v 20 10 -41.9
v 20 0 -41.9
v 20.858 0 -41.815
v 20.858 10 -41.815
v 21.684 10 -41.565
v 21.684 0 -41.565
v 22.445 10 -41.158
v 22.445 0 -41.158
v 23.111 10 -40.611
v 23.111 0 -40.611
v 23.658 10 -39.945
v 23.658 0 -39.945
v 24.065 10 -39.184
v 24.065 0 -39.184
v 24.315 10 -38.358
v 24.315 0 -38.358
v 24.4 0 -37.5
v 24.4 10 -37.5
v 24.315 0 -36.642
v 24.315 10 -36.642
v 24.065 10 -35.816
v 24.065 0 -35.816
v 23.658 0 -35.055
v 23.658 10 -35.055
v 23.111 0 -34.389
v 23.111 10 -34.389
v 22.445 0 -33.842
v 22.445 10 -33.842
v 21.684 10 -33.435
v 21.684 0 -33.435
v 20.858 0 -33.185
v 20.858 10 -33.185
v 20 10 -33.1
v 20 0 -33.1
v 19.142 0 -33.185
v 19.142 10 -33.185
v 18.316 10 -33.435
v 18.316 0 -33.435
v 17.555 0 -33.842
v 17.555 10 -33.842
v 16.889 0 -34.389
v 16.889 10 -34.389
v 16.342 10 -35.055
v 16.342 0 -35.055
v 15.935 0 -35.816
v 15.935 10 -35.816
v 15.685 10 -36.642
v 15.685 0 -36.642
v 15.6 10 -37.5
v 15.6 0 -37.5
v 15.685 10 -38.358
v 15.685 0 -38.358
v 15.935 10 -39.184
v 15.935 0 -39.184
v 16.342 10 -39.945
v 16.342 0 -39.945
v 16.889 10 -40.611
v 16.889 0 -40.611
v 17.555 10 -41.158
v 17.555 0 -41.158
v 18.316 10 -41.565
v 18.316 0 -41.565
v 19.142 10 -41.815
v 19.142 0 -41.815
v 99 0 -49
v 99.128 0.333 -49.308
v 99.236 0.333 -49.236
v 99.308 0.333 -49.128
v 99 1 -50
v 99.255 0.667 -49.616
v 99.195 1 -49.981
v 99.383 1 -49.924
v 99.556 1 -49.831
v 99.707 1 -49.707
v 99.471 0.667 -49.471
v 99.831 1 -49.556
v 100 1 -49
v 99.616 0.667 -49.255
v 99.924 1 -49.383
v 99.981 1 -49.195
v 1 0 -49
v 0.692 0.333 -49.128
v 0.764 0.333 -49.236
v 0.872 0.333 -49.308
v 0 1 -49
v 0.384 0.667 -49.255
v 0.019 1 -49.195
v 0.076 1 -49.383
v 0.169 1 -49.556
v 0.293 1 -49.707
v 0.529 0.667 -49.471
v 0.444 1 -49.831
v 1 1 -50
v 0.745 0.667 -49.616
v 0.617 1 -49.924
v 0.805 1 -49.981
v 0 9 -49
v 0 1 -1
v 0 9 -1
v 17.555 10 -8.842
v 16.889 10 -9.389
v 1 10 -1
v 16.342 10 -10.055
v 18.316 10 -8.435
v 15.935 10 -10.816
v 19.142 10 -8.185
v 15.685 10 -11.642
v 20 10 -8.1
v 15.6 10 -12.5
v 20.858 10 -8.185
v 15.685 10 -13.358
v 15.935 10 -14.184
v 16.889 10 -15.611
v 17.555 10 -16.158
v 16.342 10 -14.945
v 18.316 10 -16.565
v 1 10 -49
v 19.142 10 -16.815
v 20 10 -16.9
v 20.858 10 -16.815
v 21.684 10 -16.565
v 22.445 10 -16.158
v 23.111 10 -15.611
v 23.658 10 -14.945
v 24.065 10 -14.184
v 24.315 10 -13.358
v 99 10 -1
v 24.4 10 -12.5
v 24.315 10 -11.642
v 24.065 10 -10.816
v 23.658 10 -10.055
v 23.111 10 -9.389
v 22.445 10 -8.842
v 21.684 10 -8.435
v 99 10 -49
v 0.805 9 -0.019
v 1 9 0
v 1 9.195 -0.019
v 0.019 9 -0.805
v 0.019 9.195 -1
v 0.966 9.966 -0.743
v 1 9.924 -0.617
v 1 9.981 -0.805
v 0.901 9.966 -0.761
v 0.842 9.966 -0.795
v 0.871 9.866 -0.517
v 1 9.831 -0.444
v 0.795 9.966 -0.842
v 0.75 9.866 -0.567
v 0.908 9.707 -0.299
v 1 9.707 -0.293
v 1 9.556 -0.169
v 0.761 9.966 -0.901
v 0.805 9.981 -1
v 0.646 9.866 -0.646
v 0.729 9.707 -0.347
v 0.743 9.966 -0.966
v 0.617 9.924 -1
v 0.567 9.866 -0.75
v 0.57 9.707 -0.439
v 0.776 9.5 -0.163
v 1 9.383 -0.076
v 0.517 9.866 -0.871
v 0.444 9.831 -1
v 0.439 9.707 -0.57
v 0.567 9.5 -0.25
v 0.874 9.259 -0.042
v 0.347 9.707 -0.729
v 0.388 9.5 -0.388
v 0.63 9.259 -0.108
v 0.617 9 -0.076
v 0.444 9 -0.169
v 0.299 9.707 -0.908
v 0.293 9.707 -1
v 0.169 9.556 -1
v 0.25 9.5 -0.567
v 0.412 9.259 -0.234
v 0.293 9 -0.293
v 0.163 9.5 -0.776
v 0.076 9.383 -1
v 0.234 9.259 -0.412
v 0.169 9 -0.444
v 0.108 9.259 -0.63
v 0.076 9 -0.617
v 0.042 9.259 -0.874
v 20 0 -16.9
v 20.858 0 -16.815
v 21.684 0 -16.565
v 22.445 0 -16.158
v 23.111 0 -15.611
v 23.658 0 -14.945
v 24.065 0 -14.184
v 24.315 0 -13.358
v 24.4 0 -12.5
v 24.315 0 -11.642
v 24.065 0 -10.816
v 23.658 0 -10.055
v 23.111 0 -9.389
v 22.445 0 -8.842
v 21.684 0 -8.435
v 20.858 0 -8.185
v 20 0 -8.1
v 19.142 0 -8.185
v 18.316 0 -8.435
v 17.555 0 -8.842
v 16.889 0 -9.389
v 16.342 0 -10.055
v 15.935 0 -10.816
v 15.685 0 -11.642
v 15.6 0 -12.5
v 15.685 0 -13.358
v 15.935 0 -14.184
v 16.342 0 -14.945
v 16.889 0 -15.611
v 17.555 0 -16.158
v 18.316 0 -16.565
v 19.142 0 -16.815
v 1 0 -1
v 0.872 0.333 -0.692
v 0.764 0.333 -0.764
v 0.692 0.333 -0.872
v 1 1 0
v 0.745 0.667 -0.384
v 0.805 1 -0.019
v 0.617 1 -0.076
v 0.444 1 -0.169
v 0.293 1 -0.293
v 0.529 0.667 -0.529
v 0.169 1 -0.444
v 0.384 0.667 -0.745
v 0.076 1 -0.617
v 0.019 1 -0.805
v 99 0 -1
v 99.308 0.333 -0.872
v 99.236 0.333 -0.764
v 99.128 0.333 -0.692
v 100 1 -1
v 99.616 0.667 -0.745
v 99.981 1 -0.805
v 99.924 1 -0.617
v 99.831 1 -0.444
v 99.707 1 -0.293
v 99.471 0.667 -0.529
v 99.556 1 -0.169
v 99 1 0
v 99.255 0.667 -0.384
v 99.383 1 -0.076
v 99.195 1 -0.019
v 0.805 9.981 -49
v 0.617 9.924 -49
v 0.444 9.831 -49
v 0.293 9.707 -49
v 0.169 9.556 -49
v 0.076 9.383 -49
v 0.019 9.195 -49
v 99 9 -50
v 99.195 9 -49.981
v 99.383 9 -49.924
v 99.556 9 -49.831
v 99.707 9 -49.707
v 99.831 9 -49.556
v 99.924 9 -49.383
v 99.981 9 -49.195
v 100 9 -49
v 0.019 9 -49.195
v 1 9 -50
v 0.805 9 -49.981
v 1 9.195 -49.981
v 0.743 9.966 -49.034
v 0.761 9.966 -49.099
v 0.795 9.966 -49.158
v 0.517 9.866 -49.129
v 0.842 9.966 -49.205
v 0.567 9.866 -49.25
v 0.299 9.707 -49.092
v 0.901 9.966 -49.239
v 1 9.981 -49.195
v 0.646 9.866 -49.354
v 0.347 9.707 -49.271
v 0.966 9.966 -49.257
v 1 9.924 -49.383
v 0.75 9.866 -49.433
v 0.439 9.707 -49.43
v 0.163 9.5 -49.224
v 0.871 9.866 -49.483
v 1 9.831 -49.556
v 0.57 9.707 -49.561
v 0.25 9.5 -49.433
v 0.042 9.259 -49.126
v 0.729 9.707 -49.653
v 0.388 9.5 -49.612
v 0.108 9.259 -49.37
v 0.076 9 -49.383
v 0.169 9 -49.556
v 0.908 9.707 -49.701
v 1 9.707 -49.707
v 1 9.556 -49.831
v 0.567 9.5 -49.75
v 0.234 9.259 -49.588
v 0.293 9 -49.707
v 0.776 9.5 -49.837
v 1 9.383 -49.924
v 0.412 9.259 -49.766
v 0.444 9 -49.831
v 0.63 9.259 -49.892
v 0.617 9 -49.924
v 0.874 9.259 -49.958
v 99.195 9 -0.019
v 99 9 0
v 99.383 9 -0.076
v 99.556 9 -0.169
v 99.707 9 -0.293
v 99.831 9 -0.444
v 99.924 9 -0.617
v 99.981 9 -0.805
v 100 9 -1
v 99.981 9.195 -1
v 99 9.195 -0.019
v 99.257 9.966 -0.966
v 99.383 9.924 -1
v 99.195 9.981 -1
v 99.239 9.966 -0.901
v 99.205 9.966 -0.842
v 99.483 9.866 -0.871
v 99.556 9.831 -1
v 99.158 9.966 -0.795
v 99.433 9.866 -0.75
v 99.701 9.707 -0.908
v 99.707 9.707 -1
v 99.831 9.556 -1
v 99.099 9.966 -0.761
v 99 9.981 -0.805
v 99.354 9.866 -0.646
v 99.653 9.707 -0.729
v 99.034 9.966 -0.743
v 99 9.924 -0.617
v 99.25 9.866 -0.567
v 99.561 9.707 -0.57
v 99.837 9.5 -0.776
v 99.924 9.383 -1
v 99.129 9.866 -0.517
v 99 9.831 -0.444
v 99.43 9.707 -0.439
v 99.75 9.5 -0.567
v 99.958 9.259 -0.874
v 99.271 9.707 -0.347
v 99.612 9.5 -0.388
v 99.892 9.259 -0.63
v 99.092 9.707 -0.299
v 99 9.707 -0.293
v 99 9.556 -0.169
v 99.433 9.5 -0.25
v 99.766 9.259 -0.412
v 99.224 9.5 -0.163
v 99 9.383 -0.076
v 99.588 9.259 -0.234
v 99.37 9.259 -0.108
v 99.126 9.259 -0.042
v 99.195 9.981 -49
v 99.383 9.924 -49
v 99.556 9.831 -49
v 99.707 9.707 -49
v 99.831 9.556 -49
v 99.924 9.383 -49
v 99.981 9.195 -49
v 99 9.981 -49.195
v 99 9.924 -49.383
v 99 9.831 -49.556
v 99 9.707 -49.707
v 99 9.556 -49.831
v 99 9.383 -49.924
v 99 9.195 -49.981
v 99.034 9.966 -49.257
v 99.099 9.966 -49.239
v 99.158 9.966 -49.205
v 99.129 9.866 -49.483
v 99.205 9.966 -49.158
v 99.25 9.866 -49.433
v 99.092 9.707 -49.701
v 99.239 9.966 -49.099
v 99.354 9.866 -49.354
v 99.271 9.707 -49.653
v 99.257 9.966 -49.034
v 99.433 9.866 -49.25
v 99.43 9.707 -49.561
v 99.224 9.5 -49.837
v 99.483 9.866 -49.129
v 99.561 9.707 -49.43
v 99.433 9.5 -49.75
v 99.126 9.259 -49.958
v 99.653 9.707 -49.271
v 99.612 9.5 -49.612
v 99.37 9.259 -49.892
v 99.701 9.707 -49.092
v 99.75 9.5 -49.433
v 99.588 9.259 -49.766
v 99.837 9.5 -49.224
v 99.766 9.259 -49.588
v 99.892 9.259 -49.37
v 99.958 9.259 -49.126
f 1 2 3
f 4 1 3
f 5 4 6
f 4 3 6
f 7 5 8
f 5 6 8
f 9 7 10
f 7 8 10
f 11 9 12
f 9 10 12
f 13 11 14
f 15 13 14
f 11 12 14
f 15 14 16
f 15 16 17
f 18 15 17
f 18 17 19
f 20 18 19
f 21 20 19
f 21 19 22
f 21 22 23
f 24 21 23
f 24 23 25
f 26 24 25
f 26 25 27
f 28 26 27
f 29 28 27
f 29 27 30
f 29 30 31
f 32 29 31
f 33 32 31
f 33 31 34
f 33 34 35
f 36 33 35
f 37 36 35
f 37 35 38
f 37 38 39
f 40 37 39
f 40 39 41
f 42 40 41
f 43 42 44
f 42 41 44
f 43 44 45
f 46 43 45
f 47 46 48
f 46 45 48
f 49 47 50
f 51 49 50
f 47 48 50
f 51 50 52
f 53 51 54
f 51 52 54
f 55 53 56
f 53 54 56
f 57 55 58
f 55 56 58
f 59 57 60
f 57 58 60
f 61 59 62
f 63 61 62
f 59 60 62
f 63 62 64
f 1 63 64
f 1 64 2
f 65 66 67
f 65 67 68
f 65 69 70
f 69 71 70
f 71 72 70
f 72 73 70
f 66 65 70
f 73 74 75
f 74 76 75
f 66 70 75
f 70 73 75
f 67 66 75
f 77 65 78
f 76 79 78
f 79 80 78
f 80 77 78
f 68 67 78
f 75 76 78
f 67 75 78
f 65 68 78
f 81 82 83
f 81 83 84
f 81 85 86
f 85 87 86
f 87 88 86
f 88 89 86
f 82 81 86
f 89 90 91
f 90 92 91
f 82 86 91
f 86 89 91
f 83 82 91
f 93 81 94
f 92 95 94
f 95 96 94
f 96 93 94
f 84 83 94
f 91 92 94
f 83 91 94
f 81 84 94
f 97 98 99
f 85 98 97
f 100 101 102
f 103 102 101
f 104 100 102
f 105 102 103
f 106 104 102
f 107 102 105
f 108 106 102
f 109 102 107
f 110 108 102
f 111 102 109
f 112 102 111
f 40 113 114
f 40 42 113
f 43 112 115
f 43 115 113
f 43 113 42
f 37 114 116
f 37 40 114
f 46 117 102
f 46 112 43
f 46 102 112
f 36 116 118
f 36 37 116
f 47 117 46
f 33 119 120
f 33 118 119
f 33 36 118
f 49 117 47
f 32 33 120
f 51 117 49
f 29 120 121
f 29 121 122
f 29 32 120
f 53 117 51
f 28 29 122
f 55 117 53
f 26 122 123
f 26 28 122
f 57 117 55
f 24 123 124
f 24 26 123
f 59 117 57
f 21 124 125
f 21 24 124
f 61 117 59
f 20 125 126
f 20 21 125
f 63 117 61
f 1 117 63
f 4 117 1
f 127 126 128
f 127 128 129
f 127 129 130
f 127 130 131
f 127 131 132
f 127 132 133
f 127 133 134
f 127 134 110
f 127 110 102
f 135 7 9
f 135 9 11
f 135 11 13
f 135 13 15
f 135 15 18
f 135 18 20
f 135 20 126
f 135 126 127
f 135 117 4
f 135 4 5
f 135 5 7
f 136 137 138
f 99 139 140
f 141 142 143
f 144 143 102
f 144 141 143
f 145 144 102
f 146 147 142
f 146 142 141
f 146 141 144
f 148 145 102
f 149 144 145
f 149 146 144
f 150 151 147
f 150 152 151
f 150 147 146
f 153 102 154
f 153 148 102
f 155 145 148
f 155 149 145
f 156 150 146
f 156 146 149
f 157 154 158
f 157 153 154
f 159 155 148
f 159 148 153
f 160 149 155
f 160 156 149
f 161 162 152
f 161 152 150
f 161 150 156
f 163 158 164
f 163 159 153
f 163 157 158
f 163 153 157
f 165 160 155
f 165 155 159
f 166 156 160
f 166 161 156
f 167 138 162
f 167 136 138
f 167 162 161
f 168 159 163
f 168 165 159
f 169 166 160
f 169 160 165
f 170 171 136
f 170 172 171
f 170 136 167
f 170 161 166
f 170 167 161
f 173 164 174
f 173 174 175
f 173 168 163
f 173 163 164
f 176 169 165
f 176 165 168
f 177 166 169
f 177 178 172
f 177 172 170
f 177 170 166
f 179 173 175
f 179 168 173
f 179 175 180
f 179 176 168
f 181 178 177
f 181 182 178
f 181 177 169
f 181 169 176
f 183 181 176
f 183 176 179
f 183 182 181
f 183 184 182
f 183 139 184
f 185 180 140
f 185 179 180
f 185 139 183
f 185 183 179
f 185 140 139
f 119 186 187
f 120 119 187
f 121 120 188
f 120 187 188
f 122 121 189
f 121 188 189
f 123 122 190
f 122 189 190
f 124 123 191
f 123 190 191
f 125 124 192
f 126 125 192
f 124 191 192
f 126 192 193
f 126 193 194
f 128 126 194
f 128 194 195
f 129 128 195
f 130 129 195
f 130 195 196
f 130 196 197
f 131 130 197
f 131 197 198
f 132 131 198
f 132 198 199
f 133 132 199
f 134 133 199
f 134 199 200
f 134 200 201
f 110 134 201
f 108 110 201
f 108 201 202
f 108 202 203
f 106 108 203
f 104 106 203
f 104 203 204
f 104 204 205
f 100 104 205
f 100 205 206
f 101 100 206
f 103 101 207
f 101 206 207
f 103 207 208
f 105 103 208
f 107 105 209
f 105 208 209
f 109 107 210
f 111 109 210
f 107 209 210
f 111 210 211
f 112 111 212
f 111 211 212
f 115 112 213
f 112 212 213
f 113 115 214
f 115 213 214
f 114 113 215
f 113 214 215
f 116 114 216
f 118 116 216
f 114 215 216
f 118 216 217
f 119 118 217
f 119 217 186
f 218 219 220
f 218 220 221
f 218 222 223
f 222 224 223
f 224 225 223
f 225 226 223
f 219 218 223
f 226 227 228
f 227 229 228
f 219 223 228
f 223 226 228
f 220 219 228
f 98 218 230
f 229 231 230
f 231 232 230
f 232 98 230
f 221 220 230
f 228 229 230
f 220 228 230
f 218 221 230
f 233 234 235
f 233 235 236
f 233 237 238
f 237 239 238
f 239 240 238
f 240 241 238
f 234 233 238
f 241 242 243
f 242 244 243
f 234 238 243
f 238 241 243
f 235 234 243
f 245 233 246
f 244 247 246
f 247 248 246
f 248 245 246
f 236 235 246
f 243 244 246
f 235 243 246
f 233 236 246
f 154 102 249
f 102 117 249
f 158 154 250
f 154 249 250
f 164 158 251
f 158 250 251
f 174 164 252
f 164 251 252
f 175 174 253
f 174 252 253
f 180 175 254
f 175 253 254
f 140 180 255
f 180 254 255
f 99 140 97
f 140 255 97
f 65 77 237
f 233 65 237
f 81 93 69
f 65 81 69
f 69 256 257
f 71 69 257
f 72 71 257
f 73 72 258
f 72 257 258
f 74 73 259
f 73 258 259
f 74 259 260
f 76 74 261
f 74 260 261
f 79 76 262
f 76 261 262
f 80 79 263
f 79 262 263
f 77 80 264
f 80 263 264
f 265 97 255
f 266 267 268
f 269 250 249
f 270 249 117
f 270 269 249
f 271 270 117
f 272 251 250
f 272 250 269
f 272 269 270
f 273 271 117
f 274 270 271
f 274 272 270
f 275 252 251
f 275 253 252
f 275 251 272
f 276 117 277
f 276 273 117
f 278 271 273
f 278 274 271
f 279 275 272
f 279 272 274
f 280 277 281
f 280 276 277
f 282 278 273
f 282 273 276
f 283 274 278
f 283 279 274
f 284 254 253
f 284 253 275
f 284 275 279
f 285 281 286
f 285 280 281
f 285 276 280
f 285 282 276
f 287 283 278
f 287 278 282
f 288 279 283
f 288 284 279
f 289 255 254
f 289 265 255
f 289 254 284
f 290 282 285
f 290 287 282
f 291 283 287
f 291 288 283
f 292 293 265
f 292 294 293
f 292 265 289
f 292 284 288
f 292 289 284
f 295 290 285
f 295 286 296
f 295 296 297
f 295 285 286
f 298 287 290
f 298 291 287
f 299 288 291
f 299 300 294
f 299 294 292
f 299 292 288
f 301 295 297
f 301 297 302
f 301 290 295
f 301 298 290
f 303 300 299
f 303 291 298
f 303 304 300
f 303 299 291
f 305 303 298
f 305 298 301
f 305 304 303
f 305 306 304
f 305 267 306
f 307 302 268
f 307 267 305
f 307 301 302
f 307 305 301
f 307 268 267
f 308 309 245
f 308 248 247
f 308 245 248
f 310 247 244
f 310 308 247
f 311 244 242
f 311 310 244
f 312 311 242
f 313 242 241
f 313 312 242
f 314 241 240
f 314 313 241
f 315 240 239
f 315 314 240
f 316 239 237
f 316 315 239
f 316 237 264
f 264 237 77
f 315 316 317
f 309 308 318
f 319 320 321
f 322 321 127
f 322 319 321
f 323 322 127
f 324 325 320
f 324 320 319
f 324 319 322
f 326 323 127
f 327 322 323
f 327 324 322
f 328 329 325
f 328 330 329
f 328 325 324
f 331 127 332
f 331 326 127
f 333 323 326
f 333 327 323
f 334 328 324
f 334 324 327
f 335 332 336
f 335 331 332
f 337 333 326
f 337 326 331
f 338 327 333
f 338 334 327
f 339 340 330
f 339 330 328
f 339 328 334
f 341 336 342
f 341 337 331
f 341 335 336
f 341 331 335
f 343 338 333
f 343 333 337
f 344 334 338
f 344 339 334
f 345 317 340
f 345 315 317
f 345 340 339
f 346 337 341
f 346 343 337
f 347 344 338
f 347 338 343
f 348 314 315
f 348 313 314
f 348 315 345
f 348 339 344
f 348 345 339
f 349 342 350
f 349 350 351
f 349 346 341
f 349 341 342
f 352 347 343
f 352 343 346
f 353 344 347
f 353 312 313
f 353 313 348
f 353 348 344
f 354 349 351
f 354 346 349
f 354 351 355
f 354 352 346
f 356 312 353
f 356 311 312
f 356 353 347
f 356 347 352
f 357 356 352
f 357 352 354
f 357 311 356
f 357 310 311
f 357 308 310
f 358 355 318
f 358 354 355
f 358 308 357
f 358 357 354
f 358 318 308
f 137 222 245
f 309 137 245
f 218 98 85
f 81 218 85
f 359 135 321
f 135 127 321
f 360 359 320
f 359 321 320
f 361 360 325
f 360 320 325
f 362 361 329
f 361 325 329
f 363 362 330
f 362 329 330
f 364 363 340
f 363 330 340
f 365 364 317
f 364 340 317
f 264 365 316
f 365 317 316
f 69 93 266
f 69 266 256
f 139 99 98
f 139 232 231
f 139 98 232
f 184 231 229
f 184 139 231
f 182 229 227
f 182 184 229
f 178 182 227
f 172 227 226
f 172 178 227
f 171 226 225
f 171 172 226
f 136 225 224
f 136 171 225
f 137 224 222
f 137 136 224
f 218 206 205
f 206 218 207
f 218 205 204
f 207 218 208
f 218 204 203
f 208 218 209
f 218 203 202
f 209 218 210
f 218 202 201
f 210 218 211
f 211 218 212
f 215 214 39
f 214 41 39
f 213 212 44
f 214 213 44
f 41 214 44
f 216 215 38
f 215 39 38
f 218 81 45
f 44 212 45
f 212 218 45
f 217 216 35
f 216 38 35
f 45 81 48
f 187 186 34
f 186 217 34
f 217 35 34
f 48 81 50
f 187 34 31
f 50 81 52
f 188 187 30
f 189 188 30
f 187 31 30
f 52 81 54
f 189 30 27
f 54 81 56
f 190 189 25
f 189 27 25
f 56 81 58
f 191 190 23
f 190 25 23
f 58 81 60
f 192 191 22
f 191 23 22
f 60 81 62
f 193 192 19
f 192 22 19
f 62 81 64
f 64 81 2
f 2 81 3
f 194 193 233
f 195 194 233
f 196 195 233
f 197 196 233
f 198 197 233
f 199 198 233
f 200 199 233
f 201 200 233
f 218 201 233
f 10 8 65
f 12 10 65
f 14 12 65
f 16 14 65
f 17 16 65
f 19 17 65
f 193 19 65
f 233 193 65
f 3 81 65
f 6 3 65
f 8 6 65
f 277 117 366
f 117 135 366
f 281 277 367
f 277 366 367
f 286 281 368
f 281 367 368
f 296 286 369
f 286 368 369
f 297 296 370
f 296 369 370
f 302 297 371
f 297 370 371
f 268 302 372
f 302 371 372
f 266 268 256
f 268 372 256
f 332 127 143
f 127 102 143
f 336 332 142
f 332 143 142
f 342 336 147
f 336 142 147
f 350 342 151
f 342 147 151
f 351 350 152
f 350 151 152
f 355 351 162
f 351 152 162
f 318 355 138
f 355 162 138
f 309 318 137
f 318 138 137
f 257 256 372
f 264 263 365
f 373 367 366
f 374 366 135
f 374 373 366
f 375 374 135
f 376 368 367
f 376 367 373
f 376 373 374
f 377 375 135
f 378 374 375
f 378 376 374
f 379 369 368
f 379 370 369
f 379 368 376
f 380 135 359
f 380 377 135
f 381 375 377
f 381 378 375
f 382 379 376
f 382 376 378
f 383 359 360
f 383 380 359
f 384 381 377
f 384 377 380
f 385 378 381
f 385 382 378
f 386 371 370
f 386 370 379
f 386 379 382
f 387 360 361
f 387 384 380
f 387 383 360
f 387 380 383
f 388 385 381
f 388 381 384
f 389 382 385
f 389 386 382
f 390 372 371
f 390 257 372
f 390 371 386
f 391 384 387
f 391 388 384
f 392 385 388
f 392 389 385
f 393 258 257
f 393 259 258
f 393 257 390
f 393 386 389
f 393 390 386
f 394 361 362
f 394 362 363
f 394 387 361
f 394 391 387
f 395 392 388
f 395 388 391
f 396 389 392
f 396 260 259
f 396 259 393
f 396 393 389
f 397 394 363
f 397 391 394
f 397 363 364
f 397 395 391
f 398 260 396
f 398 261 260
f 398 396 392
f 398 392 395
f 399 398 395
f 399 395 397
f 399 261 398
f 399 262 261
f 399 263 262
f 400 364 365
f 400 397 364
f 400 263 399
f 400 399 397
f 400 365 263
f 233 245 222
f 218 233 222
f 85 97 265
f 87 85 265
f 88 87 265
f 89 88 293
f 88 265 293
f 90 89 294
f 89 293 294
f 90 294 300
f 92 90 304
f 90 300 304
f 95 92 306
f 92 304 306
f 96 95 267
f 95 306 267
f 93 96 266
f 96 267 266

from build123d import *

# Parameters (mm, degrees)
SKETCH_1_W       = 100
SKETCH_1_H       = 50
EXTRUDE_1_DEPTH  = 10
M10X1_25_1_D     = 8.8
M10X1_25_1_DEPTH = 23.75
M10X1_25_1_TIP   = 2.643786724
FILLET_1_R       = 1
CHAMFER_1_SIZE   = 1
FILLET_2_R       = 1


with BuildPart() as part:
    # 草圖1 → 填料-伸長1 (new body)
    with BuildSketch(Plane(origin=(0, 0, 0), x_dir=(1, 0, 0), z_dir=(0, 1, 0))):
        with Locations((50, 25)):
            Rectangle(SKETCH_1_W, SKETCH_1_H)
    extrude(amount=EXTRUDE_1_DEPTH)

    # M10x1.25 螺紋孔1
    with Locations(Plane(origin=(20, 10, -37.5), x_dir=(0, 0, 1), z_dir=(0, 1, 0))):
        with Locations((0, 0), (25, 0)):
            Hole(M10X1_25_1_D / 2, depth=M10X1_25_1_DEPTH)
            with Locations((0, 0, -(M10X1_25_1_DEPTH + M10X1_25_1_TIP / 2))):  # 118° drill point
                Cone(0, M10X1_25_1_D / 2, M10X1_25_1_TIP, mode=Mode.SUBTRACT)

    # 圓角1
    fillet_1_edges = [part.edges().sort_by_distance(p)[0] for p in [
        (0, 5, -50),
        (100, 5, -50),
        (100, 5, 0),
        (0, 5, 0),
    ]]
    fillet(fillet_1_edges, radius=FILLET_1_R)

    # 導角1
    chamfer_1_edges = [part.edges().sort_by_distance(p)[0] for p in [
        (50, 0, -50),
        (0, 0, -25),
        (100, 0, -25),
        (50, 0, 0),
        (99.707106781, 0, -0.292893219),
        (0.292893219, 0, -0.292893219),
        (0.292893219, 0, -49.707106781),
        (99.707106781, 0, -49.707106781),
    ]]
    chamfer(chamfer_1_edges, length=CHAMFER_1_SIZE)

    # 圓角2
    fillet_2_edges = [part.edges().sort_by_distance(p)[0] for p in [
        (50, 10, -50),
        (100, 10, -25),
        (0, 10, -25),
        (50, 10, 0),
        (99.707106781, 10, -0.292893219),
        (0.292893219, 10, -0.292893219),
        (0.292893219, 10, -49.707106781),
        (99.707106781, 10, -49.707106781),
    ]]
    fillet(fillet_2_edges, radius=FILLET_2_R)


solid = part.part
